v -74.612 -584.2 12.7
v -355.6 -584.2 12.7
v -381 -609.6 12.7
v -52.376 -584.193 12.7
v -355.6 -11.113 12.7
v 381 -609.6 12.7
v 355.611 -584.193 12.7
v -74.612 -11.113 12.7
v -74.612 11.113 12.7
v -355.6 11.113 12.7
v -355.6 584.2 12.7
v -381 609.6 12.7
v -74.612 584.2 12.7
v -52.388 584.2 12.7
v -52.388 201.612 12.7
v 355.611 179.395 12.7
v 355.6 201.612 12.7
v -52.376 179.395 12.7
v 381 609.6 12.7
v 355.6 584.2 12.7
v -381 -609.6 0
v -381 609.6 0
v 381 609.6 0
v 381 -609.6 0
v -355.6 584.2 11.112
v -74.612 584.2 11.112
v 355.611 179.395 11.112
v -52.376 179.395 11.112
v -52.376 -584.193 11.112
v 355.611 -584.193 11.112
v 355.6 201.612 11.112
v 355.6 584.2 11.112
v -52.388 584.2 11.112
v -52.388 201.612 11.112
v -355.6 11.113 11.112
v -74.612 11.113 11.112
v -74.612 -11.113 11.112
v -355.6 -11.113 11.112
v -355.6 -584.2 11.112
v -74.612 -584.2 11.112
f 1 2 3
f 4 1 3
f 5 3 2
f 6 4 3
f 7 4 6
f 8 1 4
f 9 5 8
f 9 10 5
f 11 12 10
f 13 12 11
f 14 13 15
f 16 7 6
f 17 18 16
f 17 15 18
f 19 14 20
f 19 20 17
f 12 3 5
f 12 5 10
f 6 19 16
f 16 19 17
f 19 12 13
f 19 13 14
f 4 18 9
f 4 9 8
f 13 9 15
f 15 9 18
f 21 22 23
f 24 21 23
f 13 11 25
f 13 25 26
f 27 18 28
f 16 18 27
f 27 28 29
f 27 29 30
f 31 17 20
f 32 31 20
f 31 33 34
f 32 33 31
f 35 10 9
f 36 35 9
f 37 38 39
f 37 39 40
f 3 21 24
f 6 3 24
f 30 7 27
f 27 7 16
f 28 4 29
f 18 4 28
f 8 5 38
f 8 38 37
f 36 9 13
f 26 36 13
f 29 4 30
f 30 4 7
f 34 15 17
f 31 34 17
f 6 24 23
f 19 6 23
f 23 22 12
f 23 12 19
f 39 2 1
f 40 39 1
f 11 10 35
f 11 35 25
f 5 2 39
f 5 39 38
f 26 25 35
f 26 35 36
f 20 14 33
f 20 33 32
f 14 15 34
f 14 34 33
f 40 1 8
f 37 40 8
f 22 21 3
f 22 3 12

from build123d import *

# Parameters (mm, degrees)
F0_W      = 762
F0_H      = 1219.2
F1_DEPTH  = 12.7
F3_W      = 407.9875
F3_H      = 763.5875
F4_DEPTH  = 1.5875
F6_W      = 407.9875
F6_H      = 382.5875
F7_DEPTH  = 1.5875
F9_W      = 280.9875
F9_H      = 573.0875
F10_DEPTH = 1.5875
F12_W     = 280.9875
F12_H     = 573.0875
F13_DEPTH = 1.5875


with BuildPart() as f1:
    # F0 (on Top) → F1 (new body)
    with BuildSketch(Plane.XY):
        Rectangle(F0_W, F0_H)
    extrude(amount=F1_DEPTH)

    # F3 (on face) → F4 (cut)
    with BuildSketch(Plane.XY.offset(12.7)):
        with Locations((151.617306, -202.399241)):
            Rectangle(F3_W, F3_H)
    extrude(amount=-F4_DEPTH, mode=Mode.SUBTRACT)

    # F6 (on face) → F7 (cut)
    with BuildSketch(Plane.XY.offset(12.7)):
        with Locations((151.60625, 392.90625)):
            Rectangle(F6_W, F6_H)
    extrude(amount=-F7_DEPTH, mode=Mode.SUBTRACT)

    # F9 (on face) → F10 (cut)
    with BuildSketch(Plane.XY.offset(12.7)):
        with Locations((-215.10625, -297.65625)):
            Rectangle(F9_W, F9_H)
    extrude(amount=-F10_DEPTH, mode=Mode.SUBTRACT)

    # F12 (on face) → F13 (cut)
    with BuildSketch(Plane.XY.offset(12.7)):
        with Locations((-215.10625, 297.65625)):
            Rectangle(F12_W, F12_H)
    extrude(amount=-F13_DEPTH, mode=Mode.SUBTRACT)


solid = f1.part
